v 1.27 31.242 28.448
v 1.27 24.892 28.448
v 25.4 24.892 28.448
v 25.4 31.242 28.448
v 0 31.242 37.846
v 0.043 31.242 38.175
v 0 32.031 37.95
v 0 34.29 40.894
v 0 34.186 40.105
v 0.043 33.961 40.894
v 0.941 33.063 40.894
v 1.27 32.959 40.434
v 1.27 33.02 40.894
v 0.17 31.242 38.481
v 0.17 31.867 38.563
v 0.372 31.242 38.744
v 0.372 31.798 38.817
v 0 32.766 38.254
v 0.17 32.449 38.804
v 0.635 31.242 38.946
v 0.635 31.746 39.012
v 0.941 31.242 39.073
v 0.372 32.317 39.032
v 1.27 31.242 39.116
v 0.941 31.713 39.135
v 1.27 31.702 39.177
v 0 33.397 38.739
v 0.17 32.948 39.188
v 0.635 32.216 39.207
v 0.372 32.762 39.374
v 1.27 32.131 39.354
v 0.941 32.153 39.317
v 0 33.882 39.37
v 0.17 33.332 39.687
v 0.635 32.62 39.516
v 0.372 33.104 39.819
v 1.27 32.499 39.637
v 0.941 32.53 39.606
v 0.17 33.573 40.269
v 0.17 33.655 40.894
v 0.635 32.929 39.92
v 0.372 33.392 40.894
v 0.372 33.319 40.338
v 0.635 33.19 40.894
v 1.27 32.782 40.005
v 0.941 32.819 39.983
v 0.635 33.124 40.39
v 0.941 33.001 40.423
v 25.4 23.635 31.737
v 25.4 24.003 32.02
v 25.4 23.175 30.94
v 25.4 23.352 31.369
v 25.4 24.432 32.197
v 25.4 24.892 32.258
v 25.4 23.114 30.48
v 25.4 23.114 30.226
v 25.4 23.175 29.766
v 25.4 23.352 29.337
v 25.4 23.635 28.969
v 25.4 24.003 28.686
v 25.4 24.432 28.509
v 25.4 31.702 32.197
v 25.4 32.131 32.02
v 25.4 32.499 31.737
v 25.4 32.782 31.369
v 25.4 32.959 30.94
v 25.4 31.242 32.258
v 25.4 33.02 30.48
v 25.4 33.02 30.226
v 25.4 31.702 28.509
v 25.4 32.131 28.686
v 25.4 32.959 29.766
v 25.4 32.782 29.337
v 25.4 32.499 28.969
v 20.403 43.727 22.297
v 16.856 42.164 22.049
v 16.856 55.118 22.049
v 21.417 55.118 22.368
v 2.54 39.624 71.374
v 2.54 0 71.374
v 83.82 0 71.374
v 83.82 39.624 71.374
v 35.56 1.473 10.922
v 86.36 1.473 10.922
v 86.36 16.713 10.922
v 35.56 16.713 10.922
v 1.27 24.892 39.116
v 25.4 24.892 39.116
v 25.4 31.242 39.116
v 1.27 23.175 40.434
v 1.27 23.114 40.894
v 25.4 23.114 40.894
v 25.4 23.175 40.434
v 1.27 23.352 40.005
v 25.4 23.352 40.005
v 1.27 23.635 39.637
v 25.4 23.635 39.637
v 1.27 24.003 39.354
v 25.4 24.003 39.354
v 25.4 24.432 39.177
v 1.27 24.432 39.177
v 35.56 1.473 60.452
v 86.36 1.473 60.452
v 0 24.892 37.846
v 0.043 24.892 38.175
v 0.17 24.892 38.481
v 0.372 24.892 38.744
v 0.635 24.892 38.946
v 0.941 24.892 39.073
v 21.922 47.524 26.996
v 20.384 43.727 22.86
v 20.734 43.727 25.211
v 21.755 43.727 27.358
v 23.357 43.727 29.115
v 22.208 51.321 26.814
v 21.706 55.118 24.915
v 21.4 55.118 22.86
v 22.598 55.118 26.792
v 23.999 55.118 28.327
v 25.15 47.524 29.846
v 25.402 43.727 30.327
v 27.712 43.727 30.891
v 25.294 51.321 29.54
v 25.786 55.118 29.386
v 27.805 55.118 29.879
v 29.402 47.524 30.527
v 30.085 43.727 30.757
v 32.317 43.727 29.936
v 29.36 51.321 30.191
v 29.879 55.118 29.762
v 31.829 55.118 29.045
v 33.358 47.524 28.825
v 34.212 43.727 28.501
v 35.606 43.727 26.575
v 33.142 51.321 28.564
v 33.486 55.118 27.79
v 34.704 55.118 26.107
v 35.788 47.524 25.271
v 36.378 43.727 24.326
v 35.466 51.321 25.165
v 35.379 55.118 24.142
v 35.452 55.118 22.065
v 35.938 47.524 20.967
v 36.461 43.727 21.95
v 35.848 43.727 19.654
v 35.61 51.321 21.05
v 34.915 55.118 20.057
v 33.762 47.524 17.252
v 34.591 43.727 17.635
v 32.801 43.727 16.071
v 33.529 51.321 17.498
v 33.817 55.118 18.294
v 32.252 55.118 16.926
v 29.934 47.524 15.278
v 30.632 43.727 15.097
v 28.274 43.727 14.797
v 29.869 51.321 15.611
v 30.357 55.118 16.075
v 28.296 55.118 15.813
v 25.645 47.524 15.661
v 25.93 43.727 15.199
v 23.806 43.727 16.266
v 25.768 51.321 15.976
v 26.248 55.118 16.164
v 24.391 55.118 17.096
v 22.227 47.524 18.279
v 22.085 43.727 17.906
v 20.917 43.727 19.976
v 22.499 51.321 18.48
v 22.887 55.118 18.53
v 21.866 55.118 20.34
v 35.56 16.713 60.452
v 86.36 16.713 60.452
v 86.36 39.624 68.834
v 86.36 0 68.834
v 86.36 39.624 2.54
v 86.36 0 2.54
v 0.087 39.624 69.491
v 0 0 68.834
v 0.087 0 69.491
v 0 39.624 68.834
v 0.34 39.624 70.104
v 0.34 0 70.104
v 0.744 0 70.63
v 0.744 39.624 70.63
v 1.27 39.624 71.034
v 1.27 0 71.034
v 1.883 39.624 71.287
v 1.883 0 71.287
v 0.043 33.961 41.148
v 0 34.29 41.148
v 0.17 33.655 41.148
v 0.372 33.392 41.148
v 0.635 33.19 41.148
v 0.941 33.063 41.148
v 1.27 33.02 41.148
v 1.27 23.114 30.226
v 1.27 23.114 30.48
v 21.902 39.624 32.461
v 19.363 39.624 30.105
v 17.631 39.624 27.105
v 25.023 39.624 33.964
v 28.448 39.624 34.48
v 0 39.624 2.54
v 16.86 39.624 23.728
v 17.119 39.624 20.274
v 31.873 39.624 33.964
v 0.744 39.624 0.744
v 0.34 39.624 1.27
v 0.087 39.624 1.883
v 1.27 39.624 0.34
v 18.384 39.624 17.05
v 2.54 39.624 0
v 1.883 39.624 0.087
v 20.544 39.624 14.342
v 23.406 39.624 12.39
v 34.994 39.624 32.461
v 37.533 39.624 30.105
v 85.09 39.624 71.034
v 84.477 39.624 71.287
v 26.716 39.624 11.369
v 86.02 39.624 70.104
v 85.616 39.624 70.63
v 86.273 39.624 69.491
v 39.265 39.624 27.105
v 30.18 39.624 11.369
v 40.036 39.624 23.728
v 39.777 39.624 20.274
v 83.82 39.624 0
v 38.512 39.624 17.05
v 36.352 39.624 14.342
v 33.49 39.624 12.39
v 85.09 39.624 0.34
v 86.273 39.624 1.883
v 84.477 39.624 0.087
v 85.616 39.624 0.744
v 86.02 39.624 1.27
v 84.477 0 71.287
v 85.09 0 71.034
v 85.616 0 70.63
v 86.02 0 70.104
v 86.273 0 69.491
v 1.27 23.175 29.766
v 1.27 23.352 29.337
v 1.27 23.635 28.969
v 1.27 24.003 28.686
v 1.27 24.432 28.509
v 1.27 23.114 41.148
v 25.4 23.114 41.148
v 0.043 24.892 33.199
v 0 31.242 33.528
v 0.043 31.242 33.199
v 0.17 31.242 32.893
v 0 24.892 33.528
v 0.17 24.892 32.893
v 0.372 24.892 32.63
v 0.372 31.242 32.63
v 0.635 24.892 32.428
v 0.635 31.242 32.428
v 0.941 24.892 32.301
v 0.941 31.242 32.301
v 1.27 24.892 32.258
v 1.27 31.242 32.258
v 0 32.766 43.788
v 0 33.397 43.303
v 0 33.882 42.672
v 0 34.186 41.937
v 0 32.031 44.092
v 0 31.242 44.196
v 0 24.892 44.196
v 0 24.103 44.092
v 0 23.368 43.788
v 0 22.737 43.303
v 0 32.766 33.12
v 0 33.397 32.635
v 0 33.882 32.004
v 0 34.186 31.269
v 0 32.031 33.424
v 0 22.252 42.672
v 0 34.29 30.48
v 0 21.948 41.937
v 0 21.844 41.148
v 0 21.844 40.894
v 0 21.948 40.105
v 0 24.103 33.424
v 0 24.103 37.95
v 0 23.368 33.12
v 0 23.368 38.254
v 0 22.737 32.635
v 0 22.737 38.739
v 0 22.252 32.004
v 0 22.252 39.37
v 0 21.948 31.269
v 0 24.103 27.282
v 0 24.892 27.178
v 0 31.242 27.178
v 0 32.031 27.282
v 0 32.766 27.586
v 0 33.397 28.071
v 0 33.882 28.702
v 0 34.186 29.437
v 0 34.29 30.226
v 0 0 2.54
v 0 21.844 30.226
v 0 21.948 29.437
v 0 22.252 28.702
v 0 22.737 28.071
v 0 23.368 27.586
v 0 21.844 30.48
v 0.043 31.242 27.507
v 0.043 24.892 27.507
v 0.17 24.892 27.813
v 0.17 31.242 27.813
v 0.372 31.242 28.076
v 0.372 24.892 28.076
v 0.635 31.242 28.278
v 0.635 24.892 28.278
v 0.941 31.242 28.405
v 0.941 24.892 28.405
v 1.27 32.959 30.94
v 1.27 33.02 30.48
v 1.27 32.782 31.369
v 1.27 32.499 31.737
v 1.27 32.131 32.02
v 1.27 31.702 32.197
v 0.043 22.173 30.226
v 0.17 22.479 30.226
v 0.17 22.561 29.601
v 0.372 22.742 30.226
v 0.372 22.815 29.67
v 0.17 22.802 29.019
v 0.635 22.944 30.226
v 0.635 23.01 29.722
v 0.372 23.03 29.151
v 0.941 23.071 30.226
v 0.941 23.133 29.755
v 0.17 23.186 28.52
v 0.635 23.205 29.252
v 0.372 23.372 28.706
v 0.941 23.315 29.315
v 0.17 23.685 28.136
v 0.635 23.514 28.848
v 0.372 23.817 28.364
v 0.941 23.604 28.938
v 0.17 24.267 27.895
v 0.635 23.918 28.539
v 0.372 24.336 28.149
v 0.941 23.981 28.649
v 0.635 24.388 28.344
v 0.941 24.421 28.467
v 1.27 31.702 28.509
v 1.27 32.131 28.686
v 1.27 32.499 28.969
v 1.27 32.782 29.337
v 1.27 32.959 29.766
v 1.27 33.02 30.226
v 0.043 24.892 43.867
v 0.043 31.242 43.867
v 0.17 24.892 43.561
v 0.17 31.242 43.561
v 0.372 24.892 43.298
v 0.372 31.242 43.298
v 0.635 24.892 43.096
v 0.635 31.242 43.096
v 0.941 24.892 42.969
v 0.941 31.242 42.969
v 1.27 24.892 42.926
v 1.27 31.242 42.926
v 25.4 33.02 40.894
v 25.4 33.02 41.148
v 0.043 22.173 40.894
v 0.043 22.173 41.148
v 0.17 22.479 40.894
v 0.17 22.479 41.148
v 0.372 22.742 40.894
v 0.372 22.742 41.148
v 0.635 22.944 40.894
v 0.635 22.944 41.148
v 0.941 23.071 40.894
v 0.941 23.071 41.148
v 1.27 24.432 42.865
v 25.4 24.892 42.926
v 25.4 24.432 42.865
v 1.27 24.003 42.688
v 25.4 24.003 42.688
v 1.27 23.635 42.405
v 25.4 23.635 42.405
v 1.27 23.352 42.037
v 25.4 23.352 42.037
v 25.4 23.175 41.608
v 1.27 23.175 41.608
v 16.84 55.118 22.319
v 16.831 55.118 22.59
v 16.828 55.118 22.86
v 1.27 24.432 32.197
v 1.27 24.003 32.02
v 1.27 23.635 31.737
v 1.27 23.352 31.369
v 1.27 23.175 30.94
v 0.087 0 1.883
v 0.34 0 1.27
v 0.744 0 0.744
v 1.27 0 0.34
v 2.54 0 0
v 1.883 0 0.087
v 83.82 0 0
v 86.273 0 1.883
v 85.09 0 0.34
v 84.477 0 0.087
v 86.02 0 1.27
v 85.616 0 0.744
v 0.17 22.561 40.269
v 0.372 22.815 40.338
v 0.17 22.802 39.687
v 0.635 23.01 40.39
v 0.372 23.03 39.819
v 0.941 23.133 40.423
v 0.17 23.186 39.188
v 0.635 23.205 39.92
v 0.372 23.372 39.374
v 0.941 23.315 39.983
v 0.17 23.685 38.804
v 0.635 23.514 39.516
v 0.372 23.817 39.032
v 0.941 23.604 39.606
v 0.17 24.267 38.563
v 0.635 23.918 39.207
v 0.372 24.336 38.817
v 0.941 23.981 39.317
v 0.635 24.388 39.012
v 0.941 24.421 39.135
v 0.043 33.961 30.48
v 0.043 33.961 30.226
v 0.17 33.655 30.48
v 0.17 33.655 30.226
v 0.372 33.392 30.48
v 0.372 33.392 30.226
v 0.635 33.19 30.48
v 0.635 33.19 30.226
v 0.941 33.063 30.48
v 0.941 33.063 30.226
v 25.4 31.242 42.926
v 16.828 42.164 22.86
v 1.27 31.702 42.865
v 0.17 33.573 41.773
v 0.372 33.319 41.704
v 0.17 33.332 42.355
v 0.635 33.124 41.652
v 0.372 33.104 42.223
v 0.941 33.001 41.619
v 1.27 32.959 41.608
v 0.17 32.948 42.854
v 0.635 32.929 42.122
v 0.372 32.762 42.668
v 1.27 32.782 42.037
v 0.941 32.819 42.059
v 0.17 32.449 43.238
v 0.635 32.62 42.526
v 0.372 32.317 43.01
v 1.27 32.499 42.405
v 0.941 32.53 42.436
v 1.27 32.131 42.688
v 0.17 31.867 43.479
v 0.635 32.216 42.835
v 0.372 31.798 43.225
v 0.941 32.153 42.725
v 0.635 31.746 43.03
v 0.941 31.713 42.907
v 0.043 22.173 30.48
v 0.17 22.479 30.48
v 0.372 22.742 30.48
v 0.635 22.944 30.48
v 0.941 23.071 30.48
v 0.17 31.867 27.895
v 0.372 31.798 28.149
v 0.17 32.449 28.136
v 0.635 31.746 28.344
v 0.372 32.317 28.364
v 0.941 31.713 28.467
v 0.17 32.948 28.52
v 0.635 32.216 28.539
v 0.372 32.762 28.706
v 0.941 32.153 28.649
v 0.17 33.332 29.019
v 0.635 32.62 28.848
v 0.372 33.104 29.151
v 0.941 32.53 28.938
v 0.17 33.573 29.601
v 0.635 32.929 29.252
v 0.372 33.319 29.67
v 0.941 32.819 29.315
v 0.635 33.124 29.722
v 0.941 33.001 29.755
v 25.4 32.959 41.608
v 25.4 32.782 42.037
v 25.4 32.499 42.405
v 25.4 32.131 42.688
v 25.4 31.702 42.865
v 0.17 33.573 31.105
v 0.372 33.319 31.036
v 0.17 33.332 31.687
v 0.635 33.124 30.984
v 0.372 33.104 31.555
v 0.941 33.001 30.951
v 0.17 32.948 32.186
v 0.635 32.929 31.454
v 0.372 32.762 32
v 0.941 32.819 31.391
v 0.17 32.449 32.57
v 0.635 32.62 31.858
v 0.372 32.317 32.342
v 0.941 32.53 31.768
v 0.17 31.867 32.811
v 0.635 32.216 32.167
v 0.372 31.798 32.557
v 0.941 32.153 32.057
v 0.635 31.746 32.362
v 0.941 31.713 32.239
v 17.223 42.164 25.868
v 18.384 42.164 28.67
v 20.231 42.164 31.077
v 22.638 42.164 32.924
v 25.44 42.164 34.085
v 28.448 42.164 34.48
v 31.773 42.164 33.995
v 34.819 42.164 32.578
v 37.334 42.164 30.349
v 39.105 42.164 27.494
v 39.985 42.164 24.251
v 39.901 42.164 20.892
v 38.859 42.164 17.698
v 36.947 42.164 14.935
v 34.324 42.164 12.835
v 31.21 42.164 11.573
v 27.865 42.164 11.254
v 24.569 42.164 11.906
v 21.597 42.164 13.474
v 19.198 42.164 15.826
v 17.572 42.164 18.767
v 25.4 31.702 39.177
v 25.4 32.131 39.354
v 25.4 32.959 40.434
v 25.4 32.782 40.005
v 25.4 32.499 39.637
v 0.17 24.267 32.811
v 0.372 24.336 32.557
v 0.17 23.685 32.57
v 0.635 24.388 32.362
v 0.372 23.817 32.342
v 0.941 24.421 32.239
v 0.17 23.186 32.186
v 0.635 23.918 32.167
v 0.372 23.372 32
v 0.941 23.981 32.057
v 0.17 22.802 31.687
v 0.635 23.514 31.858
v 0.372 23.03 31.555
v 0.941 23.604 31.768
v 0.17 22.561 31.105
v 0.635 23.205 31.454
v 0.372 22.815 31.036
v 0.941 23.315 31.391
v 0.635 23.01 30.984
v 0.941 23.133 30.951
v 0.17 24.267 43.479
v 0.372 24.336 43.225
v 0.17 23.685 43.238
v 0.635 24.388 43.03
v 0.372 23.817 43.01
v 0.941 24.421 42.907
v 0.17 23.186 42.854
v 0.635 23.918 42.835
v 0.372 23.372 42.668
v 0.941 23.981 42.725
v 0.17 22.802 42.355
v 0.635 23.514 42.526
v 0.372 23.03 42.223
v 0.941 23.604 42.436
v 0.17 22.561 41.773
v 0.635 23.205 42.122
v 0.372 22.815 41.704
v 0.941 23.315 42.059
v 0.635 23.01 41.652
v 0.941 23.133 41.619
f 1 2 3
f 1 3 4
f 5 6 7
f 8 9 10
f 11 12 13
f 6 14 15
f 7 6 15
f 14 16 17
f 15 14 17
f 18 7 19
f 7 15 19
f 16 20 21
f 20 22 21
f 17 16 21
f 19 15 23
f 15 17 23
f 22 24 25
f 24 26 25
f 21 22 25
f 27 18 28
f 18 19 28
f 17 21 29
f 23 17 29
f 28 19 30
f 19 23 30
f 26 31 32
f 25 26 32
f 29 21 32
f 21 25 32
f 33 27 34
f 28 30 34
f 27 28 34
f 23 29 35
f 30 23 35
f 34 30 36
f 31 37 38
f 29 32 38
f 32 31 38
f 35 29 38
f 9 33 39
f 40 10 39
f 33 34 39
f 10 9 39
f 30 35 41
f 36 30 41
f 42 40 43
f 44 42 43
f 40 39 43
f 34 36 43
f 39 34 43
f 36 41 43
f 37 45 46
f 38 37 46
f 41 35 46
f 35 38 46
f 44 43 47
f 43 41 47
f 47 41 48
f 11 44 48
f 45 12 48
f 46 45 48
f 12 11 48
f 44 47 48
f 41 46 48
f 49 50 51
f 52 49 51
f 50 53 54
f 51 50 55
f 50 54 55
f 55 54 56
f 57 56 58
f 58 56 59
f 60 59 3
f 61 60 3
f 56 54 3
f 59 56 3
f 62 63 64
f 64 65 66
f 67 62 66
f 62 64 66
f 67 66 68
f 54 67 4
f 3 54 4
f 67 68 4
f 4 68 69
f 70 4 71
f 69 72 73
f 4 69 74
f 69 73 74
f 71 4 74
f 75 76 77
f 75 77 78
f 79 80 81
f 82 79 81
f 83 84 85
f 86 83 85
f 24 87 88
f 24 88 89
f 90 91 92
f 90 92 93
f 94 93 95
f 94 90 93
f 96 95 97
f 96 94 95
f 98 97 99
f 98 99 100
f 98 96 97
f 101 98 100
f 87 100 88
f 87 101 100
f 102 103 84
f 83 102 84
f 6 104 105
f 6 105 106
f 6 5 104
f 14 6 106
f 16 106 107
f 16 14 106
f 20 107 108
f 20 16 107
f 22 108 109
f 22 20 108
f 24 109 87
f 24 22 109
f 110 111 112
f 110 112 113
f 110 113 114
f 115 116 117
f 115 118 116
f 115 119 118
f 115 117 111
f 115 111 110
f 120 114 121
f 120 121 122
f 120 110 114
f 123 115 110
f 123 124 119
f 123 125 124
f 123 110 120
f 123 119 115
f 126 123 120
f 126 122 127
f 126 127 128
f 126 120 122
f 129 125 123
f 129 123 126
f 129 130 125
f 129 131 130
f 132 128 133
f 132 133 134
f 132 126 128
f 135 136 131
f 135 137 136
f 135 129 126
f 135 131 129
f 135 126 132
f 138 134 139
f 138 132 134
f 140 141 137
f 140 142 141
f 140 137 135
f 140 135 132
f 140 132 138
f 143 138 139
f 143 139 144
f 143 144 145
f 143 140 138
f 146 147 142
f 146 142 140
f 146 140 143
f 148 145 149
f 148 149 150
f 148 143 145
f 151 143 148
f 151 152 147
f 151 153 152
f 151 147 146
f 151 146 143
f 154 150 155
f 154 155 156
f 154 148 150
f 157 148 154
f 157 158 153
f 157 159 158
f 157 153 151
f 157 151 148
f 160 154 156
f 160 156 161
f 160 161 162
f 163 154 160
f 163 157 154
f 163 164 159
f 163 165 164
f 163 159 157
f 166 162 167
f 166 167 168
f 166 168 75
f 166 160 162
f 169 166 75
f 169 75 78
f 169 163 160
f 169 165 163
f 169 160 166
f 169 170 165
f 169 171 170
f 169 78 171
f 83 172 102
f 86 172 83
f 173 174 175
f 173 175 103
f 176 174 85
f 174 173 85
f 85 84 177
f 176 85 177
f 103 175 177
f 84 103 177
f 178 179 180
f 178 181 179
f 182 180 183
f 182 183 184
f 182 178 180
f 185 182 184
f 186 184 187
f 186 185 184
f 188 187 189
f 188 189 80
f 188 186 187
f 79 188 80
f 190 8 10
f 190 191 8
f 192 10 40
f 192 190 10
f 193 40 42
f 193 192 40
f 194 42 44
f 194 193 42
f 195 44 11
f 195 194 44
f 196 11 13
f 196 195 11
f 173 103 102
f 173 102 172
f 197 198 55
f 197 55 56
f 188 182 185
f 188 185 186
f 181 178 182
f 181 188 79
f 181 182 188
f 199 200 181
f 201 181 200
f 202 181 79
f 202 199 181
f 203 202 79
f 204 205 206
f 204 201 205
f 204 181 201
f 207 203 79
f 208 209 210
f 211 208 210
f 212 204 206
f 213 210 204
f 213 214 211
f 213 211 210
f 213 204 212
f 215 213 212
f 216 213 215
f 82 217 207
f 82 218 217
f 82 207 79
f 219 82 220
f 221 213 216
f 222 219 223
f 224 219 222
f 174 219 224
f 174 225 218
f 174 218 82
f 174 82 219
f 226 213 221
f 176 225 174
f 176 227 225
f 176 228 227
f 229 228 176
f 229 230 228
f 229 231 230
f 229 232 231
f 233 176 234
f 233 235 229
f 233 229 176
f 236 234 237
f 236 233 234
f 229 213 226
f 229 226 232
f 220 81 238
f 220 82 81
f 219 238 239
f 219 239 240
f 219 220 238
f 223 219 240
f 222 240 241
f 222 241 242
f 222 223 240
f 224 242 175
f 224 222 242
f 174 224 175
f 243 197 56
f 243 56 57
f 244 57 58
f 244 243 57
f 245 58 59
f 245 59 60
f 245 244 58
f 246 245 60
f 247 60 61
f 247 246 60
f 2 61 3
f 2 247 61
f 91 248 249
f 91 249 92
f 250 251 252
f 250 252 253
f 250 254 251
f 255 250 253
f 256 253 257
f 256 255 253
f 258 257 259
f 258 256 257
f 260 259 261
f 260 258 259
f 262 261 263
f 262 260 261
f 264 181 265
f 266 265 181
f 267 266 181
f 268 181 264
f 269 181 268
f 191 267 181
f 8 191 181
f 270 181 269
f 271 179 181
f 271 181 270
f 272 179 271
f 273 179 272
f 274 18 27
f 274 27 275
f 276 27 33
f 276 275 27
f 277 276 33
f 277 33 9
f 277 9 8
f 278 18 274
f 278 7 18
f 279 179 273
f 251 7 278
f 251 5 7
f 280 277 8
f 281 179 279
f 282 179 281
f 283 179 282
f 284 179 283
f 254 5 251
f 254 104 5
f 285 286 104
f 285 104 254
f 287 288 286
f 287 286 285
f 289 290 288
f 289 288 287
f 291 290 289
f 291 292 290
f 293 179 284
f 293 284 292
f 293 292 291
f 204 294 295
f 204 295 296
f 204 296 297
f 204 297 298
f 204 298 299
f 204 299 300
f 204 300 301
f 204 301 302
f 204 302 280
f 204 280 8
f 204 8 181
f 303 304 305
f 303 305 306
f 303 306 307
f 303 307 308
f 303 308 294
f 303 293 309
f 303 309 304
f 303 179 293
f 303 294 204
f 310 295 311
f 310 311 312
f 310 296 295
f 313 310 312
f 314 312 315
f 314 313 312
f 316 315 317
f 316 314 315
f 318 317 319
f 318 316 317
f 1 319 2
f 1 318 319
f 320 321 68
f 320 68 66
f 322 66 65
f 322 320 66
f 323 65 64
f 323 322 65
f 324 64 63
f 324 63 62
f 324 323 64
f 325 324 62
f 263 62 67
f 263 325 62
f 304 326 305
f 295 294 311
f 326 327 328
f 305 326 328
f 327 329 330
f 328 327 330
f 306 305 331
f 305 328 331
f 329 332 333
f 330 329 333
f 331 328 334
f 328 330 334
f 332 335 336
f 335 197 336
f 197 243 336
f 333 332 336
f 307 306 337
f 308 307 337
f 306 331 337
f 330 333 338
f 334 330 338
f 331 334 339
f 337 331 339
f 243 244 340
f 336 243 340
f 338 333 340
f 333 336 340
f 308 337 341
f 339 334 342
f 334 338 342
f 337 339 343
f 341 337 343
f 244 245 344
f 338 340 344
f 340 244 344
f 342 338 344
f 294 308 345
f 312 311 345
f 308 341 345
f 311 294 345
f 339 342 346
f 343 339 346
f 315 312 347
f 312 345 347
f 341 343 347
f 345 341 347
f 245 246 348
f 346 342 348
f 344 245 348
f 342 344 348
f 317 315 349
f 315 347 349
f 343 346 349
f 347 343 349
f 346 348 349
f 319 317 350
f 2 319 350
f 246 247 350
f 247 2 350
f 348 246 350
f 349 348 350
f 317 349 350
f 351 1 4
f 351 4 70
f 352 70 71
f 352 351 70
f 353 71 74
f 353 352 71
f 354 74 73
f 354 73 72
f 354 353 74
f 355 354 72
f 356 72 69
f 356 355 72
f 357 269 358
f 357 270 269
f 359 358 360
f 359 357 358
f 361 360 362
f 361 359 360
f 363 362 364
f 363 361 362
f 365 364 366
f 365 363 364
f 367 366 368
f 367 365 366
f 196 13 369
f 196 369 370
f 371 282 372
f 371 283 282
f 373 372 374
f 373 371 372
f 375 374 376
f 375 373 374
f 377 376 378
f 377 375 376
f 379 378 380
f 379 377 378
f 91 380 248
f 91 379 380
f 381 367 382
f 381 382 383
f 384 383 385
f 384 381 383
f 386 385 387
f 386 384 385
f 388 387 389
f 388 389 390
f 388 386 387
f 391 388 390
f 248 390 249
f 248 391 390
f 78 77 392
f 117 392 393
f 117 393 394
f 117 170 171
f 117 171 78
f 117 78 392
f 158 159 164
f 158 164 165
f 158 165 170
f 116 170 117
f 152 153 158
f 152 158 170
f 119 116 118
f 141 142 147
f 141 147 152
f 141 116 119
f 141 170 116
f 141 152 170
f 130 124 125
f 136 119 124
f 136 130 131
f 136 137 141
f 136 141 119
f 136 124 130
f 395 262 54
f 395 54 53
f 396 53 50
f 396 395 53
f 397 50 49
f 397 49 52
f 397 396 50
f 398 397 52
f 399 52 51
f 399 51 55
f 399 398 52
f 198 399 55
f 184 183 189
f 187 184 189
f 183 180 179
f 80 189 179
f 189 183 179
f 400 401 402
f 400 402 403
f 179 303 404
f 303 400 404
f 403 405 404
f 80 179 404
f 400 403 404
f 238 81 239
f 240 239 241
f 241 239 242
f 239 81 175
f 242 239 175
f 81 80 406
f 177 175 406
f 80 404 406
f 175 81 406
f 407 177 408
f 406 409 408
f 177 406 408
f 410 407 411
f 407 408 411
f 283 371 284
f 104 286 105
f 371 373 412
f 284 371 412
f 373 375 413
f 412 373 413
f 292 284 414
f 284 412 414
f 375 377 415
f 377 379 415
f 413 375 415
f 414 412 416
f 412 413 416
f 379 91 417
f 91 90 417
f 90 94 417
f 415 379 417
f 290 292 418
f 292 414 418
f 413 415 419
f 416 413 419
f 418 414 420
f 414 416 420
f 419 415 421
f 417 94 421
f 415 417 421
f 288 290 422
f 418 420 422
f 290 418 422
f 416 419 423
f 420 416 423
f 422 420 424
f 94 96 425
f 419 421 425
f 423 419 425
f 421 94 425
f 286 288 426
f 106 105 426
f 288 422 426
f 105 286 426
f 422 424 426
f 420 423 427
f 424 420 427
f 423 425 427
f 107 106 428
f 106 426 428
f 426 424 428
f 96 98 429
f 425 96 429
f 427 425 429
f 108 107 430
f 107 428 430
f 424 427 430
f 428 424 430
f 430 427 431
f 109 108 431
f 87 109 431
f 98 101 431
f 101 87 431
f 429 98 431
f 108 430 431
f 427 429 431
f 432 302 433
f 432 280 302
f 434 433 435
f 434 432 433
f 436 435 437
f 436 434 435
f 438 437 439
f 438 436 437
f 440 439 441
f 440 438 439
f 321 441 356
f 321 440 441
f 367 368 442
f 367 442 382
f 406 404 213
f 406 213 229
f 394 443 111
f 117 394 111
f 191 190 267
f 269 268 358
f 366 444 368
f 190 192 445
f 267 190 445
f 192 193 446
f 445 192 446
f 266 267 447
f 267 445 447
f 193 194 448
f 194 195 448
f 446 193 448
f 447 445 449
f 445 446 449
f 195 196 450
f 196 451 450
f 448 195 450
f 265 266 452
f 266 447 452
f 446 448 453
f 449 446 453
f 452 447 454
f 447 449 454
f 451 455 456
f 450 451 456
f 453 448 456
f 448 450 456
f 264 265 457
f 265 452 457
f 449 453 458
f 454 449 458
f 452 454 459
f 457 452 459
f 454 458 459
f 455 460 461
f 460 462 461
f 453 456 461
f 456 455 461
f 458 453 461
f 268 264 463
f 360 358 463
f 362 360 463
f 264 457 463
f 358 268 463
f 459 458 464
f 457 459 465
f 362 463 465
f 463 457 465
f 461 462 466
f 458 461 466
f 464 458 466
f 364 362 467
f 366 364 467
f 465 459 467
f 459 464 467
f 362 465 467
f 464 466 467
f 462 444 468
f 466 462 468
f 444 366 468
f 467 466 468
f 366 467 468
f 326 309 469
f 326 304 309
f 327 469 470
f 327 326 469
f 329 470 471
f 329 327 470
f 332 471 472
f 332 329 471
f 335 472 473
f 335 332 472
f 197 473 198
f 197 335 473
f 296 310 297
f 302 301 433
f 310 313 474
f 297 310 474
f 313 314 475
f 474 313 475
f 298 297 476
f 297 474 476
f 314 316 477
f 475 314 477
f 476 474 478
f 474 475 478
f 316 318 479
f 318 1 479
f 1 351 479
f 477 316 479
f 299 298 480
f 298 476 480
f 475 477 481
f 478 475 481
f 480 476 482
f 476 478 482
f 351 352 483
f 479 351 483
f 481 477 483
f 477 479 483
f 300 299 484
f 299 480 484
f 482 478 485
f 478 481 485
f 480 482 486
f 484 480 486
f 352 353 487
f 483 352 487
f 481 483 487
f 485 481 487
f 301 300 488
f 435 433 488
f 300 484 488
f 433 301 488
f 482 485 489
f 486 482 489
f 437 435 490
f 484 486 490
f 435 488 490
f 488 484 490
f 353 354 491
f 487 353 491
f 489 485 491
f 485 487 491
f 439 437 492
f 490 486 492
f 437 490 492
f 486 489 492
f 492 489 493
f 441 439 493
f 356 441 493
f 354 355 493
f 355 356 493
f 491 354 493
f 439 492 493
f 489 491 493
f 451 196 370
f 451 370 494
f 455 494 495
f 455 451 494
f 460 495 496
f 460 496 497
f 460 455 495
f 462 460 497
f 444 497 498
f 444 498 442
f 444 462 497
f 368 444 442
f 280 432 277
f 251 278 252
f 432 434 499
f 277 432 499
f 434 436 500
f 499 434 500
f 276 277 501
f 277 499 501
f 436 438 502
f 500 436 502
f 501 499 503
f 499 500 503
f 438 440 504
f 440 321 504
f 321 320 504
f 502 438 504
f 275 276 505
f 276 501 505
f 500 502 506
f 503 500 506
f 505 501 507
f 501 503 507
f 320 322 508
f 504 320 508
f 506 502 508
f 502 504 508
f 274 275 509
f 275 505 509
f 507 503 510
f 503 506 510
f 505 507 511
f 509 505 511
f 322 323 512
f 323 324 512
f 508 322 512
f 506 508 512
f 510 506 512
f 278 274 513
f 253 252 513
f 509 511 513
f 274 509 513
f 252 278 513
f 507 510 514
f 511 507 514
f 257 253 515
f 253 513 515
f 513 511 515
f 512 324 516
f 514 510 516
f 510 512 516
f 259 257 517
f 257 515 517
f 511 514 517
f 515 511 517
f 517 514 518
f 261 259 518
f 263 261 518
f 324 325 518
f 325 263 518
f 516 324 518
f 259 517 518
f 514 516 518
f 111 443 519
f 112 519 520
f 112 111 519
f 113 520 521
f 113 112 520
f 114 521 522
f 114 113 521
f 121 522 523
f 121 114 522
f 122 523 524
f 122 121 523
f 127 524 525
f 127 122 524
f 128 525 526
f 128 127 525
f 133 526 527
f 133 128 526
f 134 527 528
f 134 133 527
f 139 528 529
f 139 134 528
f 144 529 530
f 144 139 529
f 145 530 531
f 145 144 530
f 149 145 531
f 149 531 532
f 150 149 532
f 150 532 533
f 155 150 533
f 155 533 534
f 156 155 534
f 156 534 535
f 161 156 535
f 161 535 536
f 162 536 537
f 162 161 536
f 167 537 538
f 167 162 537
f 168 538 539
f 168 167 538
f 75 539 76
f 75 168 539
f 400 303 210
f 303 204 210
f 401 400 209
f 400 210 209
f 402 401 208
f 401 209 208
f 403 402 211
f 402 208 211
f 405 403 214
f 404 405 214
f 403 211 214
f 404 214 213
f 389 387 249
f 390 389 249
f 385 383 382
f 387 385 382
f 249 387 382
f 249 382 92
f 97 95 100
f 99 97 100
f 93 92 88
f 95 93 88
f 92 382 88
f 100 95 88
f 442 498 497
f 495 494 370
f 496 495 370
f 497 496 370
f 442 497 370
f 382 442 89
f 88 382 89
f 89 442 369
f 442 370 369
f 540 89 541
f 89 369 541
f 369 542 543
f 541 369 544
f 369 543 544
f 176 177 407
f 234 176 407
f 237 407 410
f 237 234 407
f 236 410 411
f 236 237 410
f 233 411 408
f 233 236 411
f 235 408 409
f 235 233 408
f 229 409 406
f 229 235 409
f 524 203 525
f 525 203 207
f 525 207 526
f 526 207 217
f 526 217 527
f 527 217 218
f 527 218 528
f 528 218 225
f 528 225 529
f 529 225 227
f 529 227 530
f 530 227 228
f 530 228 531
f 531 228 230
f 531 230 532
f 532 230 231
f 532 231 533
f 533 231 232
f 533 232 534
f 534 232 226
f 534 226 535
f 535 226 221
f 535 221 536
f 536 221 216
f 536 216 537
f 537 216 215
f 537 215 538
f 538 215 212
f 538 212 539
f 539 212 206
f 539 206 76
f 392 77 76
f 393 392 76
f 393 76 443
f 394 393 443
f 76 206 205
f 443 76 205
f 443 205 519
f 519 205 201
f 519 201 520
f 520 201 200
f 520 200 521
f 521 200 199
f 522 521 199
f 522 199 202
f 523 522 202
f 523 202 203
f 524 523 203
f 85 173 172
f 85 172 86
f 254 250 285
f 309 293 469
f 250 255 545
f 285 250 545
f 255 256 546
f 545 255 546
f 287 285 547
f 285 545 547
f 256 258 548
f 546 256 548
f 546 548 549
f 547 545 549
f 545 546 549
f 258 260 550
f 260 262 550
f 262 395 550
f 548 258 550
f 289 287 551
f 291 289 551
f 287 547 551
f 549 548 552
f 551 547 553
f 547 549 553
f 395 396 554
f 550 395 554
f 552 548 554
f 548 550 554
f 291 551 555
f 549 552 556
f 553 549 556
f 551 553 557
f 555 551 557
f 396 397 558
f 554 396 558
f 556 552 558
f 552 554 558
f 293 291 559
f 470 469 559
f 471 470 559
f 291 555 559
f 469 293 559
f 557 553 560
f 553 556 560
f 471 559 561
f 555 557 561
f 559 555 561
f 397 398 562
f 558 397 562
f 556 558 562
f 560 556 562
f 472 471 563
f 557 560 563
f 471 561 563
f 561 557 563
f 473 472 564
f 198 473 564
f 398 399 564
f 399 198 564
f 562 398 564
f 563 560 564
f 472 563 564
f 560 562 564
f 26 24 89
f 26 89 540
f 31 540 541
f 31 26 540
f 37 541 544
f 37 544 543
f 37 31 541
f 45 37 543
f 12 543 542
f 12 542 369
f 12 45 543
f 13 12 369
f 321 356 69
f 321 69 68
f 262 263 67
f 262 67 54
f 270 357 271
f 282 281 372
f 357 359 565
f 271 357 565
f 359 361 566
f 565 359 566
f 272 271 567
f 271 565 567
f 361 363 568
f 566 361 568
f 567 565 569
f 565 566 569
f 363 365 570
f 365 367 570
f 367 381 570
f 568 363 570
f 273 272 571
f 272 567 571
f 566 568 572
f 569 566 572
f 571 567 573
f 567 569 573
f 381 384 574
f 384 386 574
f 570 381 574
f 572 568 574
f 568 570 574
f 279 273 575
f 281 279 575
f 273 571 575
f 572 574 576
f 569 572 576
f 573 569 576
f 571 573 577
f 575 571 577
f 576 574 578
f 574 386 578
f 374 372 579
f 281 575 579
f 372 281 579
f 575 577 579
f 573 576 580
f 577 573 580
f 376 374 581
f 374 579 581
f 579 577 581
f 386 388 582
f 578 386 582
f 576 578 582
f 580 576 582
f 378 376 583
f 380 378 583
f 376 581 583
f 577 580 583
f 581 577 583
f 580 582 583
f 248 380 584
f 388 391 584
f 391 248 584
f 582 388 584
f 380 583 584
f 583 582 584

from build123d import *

# Parameters (mm, degrees)
SKETCH1_W           = 86.36
SKETCH1_H           = 71.374
BOSS_EXTRUDE1_DEPTH = 39.624
FILLET1_R           = 2.54
CUT_EXTRUDE1_DEPTH  = 25.4
FILLET2_R           = 1.27
SKETCH4_W           = 49.53
SKETCH4_H           = 15.24
CUT_EXTRUDE2_DEPTH  = 50.8
SKETCH5_R           = 11.6205
BOSS_EXTRUDE2_DEPTH = 15.494
CUT_REVOLVE1_ANGLE  = 356


with BuildPart() as part:
    # Sketch1 → Boss-Extrude1 (new body)
    with BuildSketch(Plane(origin=(0, 0, 0), x_dir=(1, 0, 0), z_dir=(0, 1, 0))):
        with Locations((43.18, -35.687)):
            Rectangle(SKETCH1_W, SKETCH1_H)
    extrude(amount=BOSS_EXTRUDE1_DEPTH)

    # Fillet1
    fillet1_edges = [part.edges().sort_by_distance(p)[0] for p in [
        (0, 19.812, 0),
        (86.36, 19.812, 0),
        (86.36, 19.812, 71.374),
        (0, 19.812, 71.374),
    ]]
    fillet(fillet1_edges, radius=FILLET1_R)

    # Sketch2 → Cut-Extrude1 (cut)
    with BuildSketch(Plane.ZY):
        with BuildLine():
            Line((30.226, 33.02), (30.48, 33.02))
            ThreePointArc((30.48, 33.02), (31.737235857, 32.499235857), (32.258, 31.242))
            Line((32.258, 31.242), (32.258, 24.892))
            ThreePointArc((32.258, 24.892), (31.737235857, 23.634764143), (30.48, 23.114))
            Line((30.48, 23.114), (30.226, 23.114))
            ThreePointArc((30.226, 23.114), (28.968764143, 23.634764143), (28.448, 24.892))
            Line((28.448, 24.892), (28.448, 31.242))
            ThreePointArc((28.448, 31.242), (28.968764143, 32.499235857), (30.226, 33.02))
        make_face()
        with BuildLine():
            Line((41.148, 23.114), (40.894, 23.114))
            ThreePointArc((40.894, 23.114), (39.636764143, 23.634764143), (39.116, 24.892))
            Line((39.116, 24.892), (39.116, 31.242))
            ThreePointArc((39.116, 31.242), (39.636764143, 32.499235857), (40.894, 33.02))
            Line((40.894, 33.02), (41.148, 33.02))
            ThreePointArc((41.148, 33.02), (42.405235857, 32.499235857), (42.926, 31.242))
            Line((42.926, 31.242), (42.926, 24.892))
            ThreePointArc((42.926, 24.892), (42.405235857, 23.634764143), (41.148, 23.114))
        make_face()
    extrude(amount=-CUT_EXTRUDE1_DEPTH, mode=Mode.SUBTRACT)

    # Fillet2
    fillet2_edges = [part.edges().sort_by_distance(p)[0] for p in [
        (0, 23.634764143, 28.968764143),
        (0, 23.114, 30.353),
        (0, 23.634764143, 31.737235857),
        (0, 28.067, 32.258),
        (0, 32.499235857, 31.737235857),
        (0, 33.02, 30.353),
        (0, 32.499235857, 28.968764143),
        (0, 28.067, 28.448),
        (0, 23.634764143, 42.405235857),
        (0, 28.067, 42.926),
        (0, 32.499235857, 42.405235857),
        (0, 33.02, 41.021),
        (0, 32.499235857, 39.636764143),
        (0, 28.067, 39.116),
        (0, 23.634764143, 39.636764143),
        (0, 23.114, 41.021),
    ]]
    fillet(fillet2_edges, radius=FILLET2_R)

    # Sketch4 → Cut-Extrude2 (cut)
    with BuildSketch(Plane(origin=(86.36, 0, 0), x_dir=(0, 0, -1), z_dir=(1, 0, 0))):
        with Locations((-35.687, 9.0932)):
            Rectangle(SKETCH4_W, SKETCH4_H)
    extrude(amount=-CUT_EXTRUDE2_DEPTH, mode=Mode.SUBTRACT)

    # Sketch5 → Boss-Extrude2 (add)
    with BuildSketch(Plane(origin=(0, 39.624, 0), x_dir=(1, 0, 0), z_dir=(0, 1, 0))):
        with Locations(Location((28.448, -22.86, 0), (0, 0, 270))):
            Circle(SKETCH5_R)
    extrude(amount=BOSS_EXTRUDE2_DEPTH)

    # Sketch7 → Cut-Revolve1 (revolve, cut)
    with BuildSketch(Plane(origin=(0, 0, 22.86), x_dir=(-1, 0, 0), z_dir=(0, 0, -1))):
        Polygon((-16.8275, 42.164), (-20.3835, 43.727171461), (-21.3995, 55.118), (-16.8275, 55.118), align=None)
    revolve(axis=Axis((28.448, 55.118, 22.86), (0, 1, 0)), revolution_arc=CUT_REVOLVE1_ANGLE, mode=Mode.SUBTRACT)


solid = part.part
